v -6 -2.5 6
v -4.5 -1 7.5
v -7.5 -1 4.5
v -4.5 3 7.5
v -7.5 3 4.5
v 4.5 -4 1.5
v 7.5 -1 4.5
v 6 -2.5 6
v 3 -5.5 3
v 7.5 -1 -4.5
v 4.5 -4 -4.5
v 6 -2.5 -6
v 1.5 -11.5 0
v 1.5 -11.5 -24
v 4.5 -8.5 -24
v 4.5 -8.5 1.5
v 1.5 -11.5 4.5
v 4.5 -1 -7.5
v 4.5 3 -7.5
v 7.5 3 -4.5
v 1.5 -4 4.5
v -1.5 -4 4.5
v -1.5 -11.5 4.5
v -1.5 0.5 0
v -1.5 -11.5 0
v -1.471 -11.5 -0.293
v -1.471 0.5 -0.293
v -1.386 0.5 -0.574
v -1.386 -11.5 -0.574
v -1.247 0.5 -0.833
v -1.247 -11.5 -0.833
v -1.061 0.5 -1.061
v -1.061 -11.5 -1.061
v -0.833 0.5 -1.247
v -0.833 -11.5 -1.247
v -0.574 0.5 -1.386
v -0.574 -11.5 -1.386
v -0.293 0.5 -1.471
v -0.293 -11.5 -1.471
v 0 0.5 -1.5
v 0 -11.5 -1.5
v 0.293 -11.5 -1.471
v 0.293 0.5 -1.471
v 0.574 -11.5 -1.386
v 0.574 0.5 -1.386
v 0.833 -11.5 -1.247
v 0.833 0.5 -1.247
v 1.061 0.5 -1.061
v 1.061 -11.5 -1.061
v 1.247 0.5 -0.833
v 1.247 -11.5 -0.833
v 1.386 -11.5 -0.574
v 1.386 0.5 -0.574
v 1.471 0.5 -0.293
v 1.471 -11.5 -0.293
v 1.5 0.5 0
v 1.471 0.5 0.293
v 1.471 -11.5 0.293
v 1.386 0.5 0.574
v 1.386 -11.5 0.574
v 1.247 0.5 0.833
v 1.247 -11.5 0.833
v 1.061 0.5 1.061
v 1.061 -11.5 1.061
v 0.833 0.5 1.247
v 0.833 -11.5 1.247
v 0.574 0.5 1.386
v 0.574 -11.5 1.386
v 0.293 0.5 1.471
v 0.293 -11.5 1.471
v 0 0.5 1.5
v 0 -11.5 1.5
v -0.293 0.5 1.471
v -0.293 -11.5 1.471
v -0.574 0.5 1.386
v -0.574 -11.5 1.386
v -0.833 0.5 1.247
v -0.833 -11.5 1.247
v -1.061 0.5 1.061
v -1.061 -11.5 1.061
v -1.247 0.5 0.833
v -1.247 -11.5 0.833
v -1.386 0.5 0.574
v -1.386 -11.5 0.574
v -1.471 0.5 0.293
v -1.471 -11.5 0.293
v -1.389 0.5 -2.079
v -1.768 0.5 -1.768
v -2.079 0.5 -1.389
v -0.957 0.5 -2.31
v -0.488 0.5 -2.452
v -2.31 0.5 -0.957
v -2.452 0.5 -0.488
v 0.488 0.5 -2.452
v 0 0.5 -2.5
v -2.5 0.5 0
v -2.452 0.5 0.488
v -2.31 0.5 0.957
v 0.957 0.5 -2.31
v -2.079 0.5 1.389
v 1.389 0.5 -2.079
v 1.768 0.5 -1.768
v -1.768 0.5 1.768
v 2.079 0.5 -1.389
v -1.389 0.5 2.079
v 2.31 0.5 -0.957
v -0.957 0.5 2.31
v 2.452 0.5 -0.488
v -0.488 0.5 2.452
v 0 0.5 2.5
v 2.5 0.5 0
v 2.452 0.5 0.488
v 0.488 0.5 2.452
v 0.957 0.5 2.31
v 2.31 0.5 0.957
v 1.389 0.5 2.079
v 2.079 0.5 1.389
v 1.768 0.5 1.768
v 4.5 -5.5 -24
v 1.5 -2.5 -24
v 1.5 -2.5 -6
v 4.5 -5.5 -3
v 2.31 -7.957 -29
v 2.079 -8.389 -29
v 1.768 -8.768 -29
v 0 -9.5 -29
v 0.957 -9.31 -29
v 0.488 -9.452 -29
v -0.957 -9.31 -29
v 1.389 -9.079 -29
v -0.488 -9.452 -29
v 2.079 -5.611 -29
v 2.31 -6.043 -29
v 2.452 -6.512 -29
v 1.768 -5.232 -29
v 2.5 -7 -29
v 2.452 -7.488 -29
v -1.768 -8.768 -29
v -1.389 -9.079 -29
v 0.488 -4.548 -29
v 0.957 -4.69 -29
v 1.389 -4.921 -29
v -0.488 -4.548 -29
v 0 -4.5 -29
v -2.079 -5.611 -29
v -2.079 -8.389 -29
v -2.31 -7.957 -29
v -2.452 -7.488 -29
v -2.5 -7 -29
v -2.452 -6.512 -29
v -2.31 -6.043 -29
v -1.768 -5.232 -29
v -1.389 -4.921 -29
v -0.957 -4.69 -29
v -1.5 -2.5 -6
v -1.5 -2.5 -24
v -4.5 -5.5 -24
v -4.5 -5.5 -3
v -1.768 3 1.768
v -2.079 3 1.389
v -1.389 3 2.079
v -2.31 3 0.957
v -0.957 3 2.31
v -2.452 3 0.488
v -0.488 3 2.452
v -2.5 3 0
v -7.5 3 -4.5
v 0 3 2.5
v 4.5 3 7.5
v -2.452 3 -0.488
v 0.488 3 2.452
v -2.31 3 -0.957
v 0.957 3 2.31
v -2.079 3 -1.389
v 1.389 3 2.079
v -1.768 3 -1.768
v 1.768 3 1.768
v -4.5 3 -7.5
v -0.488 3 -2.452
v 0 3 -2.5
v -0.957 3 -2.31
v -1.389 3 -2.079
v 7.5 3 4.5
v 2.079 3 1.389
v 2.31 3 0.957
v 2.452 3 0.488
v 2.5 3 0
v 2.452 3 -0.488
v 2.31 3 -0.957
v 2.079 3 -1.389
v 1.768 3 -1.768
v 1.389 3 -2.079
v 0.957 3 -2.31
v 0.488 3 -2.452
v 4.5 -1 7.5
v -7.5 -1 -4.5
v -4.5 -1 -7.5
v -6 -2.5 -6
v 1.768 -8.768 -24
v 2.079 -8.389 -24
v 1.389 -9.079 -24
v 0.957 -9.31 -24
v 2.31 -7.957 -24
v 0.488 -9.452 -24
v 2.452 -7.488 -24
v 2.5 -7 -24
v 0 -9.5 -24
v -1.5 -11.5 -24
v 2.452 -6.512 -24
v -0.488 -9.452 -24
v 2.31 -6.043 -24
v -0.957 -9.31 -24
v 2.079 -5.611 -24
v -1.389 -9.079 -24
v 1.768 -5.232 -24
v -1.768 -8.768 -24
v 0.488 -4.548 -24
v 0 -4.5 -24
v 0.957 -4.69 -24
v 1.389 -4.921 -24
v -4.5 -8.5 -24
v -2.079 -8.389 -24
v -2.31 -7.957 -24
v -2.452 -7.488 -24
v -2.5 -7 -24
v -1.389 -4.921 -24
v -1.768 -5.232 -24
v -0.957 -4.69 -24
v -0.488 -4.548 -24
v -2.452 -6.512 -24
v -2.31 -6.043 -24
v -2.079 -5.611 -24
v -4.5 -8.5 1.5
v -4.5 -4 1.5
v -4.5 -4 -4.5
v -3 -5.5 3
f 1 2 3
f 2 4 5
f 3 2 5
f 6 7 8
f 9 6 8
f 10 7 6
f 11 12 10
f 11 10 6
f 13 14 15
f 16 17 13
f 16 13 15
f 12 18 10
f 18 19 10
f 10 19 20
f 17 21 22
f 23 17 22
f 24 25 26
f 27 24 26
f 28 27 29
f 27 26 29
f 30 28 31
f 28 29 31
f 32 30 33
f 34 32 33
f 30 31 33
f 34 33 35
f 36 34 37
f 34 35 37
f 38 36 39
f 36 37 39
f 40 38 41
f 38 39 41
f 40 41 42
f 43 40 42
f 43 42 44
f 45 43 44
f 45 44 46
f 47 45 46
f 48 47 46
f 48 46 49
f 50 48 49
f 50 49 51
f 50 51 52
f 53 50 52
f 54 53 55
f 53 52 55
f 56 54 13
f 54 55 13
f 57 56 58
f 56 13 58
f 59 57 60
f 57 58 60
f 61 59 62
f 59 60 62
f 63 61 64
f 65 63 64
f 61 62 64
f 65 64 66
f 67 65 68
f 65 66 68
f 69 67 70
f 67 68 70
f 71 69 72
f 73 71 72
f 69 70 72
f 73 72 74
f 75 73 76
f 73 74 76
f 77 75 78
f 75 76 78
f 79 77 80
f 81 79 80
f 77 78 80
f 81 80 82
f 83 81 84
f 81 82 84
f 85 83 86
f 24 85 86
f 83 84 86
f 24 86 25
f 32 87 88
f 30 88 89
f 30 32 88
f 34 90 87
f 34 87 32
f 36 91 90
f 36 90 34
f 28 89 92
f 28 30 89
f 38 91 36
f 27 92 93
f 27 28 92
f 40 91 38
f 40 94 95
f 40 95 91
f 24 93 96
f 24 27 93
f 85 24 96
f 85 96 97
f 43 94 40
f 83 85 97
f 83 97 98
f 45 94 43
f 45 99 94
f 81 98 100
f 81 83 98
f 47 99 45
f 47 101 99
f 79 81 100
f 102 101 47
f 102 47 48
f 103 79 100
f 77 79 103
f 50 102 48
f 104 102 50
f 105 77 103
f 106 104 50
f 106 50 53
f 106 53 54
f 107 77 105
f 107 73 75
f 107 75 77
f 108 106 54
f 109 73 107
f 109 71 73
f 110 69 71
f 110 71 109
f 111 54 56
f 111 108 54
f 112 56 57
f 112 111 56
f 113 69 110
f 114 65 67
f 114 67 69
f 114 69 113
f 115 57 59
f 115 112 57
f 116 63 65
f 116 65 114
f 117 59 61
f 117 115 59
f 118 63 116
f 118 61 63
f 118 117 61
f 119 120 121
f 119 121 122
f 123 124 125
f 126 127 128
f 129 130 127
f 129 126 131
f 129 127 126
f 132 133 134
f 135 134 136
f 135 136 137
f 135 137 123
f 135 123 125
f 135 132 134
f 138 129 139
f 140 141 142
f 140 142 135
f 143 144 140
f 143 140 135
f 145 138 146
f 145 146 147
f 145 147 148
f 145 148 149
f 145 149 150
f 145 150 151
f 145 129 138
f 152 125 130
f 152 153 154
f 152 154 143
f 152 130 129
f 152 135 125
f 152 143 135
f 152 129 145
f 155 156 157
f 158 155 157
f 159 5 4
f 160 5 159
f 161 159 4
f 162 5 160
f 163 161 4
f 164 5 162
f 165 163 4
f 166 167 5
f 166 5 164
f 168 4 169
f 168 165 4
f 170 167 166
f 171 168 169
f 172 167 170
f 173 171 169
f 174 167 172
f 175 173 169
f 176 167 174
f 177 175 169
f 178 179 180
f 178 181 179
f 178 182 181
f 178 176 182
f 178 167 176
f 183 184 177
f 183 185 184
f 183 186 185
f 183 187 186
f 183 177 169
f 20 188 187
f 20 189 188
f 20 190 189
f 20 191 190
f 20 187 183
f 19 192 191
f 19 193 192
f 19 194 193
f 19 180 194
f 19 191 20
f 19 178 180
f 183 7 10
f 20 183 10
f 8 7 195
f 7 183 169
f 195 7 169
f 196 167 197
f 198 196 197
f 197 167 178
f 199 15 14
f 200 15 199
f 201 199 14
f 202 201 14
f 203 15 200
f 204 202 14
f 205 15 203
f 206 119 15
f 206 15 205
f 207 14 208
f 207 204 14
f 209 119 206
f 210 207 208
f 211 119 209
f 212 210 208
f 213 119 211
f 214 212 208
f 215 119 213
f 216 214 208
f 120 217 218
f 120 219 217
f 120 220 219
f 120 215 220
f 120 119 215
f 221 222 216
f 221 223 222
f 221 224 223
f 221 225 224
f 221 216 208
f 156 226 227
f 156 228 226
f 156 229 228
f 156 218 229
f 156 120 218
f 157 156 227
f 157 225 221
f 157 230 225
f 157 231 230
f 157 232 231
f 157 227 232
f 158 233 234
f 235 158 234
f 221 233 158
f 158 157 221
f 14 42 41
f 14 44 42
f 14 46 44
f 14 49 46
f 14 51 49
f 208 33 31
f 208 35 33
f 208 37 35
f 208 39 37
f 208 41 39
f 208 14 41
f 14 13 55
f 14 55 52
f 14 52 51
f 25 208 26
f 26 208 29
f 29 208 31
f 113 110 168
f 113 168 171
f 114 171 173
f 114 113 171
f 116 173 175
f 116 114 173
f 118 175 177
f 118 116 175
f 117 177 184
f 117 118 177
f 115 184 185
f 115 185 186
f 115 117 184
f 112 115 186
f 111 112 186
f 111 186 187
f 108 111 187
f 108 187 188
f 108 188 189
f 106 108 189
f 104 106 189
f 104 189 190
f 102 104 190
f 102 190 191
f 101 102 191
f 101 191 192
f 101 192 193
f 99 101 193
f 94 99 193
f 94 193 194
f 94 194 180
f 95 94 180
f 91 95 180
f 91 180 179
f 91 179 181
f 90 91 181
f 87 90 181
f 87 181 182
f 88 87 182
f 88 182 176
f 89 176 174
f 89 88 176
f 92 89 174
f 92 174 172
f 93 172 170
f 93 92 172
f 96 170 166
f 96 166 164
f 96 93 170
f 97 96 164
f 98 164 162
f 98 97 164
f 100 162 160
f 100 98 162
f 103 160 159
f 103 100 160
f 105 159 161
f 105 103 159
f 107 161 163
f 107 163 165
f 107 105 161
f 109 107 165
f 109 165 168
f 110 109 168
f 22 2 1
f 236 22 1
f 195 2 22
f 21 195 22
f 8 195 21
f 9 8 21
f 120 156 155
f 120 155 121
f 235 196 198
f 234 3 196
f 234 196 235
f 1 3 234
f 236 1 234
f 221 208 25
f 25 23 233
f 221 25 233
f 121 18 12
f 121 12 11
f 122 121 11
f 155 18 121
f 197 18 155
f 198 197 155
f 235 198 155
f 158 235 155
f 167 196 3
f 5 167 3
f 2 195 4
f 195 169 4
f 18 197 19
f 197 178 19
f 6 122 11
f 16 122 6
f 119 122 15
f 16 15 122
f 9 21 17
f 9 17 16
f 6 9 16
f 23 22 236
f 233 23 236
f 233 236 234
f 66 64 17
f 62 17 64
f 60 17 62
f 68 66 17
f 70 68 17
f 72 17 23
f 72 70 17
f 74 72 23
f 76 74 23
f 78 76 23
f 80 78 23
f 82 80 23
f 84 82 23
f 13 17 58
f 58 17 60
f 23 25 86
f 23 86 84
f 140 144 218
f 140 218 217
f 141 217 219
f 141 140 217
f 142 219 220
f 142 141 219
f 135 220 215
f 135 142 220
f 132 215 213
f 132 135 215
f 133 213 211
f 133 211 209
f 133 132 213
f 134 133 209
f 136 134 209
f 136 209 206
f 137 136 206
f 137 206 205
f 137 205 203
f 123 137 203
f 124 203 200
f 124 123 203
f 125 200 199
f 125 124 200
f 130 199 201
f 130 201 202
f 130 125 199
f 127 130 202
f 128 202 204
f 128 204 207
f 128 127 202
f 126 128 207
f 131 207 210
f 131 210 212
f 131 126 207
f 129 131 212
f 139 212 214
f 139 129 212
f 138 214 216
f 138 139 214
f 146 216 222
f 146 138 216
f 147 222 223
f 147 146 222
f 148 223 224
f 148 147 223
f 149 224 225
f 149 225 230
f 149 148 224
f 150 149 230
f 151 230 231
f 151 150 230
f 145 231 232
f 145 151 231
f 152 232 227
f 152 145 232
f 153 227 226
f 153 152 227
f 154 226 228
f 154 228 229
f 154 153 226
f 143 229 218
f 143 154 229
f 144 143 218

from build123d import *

# Parameters (mm, degrees)
SKETCH1_W                = 15
SKETCH1_H                = 15
SKETCH1_R                = 2.5
BOSS_EXTRUDE1_DEPTH      = 3
CHAMFER1_SIZE            = 3
SKETCH1_6_R              = 2.5
BOSS_EXTRUDE3_DEPTH      = 0.5
SKETCH18_W               = 9
SKETCH18_H               = 9
CHAMFER4_SIZE            = 4
CHAMFER5_SIZE            = 3
SKETCH19_OUTSIDE_W       = 25.408
SKETCH19_OUTSIDE_H       = 24.908
SKETCH19_OUTSIDE_R       = 2.5
CUT_EXTRUDE2_DEPTH       = 5
F_3_0_3_DIAMETER_HOLE1_D = 3


with BuildPart() as part:
    # Sketch1 → Boss-Extrude1 (new body)
    with BuildSketch(Plane(origin=(0, 0, 0), x_dir=(1, 0, 0), z_dir=(0, 1, 0))):
        Rectangle(SKETCH1_W, SKETCH1_H)
        with Locations(Location((0, 0, 0), (0, 0, 270))):
            Circle(SKETCH1_R, mode=Mode.SUBTRACT)
    extrude(amount=BOSS_EXTRUDE1_DEPTH)

    # Chamfer1
    chamfer1_edges = [part.edges().sort_by_distance(p)[0] for p in [
        (7.5, 1.5, 7.5),
        (-7.5, 1.5, 7.5),
        (-7.5, 1.5, -7.5),
        (7.5, 1.5, -7.5),
    ]]
    chamfer(chamfer1_edges, length=CHAMFER1_SIZE)

    # Sketch1<6> → Boss-Extrude3 (add)
    with BuildSketch(Plane(origin=(0, 0, 0), x_dir=(1, 0, 0), z_dir=(0, 1, 0))):
        with Locations(Location((0, 0, 0), (0, 0, 270))):
            Circle(SKETCH1_6_R)
    extrude(amount=BOSS_EXTRUDE3_DEPTH)

    # Sweep3: sweep along a path in Sketch2
    with BuildLine(Plane(origin=(0, 0, 0), x_dir=(0, 0, -1), z_dir=(1, 0, 0))) as sweep3_path:
        Line((0, 0), (0, -7))
        Line((0, -7), (29, -7))
    # Sketch18 → Sweep3 (sweep)
    with BuildSketch(Plane.XZ):
        Rectangle(SKETCH18_W, SKETCH18_H)
    sweep(path=sweep3_path.line, transition=Transition.RIGHT)

    # Chamfer4
    # the kernel refuses this chamfer: 4 mm, written as the material it adds along each edge
    with BuildSketch(Plane(origin=(-14.786731952, 0, -4.5), x_dir=(0, 0, -1), z_dir=(1, 0, 0))) as chamfer4_piece_1_section:
        Polygon((CHAMFER4_SIZE, 0), (0, -CHAMFER4_SIZE), (0, 0), align=None)
    chamfer4_piece_1 = extrude(amount=29.573463904, mode=Mode.PRIVATE)
    chamfer4_piece_1 = split(chamfer4_piece_1, bisect_by=Plane(origin=(-14.786731952, 0, -7.5), z_dir=(0, 0, 1)), keep=Keep.TOP, mode=Mode.PRIVATE)
    chamfer4_piece_1 = split(chamfer4_piece_1, bisect_by=Plane(origin=(-11.143365976, 0, -0.856634024), z_dir=(0.7071067811865476, 0, 0.7071067811865476)), keep=Keep.TOP, mode=Mode.PRIVATE)
    chamfer4_piece_1 = split(chamfer4_piece_1, bisect_by=Plane(origin=(-3.643365976, 0, -15.643365976), z_dir=(-0.7071067811865476, 0, 0.7071067811865476)), keep=Keep.TOP, mode=Mode.PRIVATE)
    chamfer4_piece_1 = split(chamfer4_piece_1, bisect_by=Plane(origin=(-11.643365976, 3.143365976, -4.5), z_dir=(0.7071067811865476, 0.7071067811865475, 0)), keep=Keep.TOP, mode=Mode.PRIVATE)
    chamfer4_piece_1 = split(chamfer4_piece_1, bisect_by=Plane(origin=(-3.143365976, -11.643365976, -4.5), z_dir=(-0.7071067811865476, 0.7071067811865475, 0)), keep=Keep.TOP, mode=Mode.PRIVATE)
    add(chamfer4_piece_1)
    with BuildSketch(Plane(origin=(4.5, 0, -14.786731952), x_dir=(1, 0, 0), z_dir=(0, 0, 1))) as chamfer4_piece_2_section:
        Polygon((CHAMFER4_SIZE, 0), (0, -CHAMFER4_SIZE), (0, 0), align=None)
    chamfer4_piece_2 = extrude(amount=29.573463904, mode=Mode.PRIVATE)
    chamfer4_piece_2 = split(chamfer4_piece_2, bisect_by=Plane(origin=(0.856634024, 0, -11.143365976), z_dir=(-0.7071067811865476, 0, 0.7071067811865476)), keep=Keep.TOP, mode=Mode.PRIVATE)
    chamfer4_piece_2 = split(chamfer4_piece_2, bisect_by=Plane(origin=(7.5, 0, -14.786731952), z_dir=(-1, 0, 0)), keep=Keep.TOP, mode=Mode.PRIVATE)
    chamfer4_piece_2 = split(chamfer4_piece_2, bisect_by=Plane(origin=(15.643365976, 0, -3.643365976), z_dir=(-0.7071067811865476, 0, -0.7071067811865476)), keep=Keep.TOP, mode=Mode.PRIVATE)
    chamfer4_piece_2 = split(chamfer4_piece_2, bisect_by=Plane(origin=(4.5, 3.143365976, -11.643365976), z_dir=(0, 0.7071067811865475, 0.7071067811865476)), keep=Keep.TOP, mode=Mode.PRIVATE)
    chamfer4_piece_2 = split(chamfer4_piece_2, bisect_by=Plane(origin=(4.5, -11.643365976, -3.143365976), z_dir=(0, 0.7071067811865477, -0.7071067811865475)), keep=Keep.TOP, mode=Mode.PRIVATE)
    add(chamfer4_piece_2)
    with BuildSketch(Plane(origin=(14.786731952, 0, 4.5), x_dir=(0, 0, 1), z_dir=(-1, 0, 0))) as chamfer4_piece_3_section:
        Polygon((CHAMFER4_SIZE, 0), (0, -CHAMFER4_SIZE), (0, 0), align=None)
    chamfer4_piece_3 = extrude(amount=29.573463904, mode=Mode.PRIVATE)
    chamfer4_piece_3 = split(chamfer4_piece_3, bisect_by=Plane(origin=(3.643365976, 0, 15.643365976), z_dir=(0.7071067811865476, 0, -0.7071067811865476)), keep=Keep.TOP, mode=Mode.PRIVATE)
    chamfer4_piece_3 = split(chamfer4_piece_3, bisect_by=Plane(origin=(11.143365976, 0, 0.856634024), z_dir=(-0.7071067811865476, 0, -0.7071067811865476)), keep=Keep.TOP, mode=Mode.PRIVATE)
    chamfer4_piece_3 = split(chamfer4_piece_3, bisect_by=Plane(origin=(14.786731952, 0, 7.5), z_dir=(0, 0, -1)), keep=Keep.TOP, mode=Mode.PRIVATE)
    chamfer4_piece_3 = split(chamfer4_piece_3, bisect_by=Plane(origin=(3.143365976, -11.643365976, 4.5), z_dir=(0.7071067811865476, 0.7071067811865475, 0)), keep=Keep.TOP, mode=Mode.PRIVATE)
    chamfer4_piece_3 = split(chamfer4_piece_3, bisect_by=Plane(origin=(11.643365976, 3.143365976, 4.5), z_dir=(-0.7071067811865476, 0.7071067811865475, 0)), keep=Keep.TOP, mode=Mode.PRIVATE)
    add(chamfer4_piece_3)
    with BuildSketch(Plane(origin=(-4.5, 0, 14.786731952), x_dir=(-1, 0, 0), z_dir=(0, 0, -1))) as chamfer4_piece_4_section:
        Polygon((CHAMFER4_SIZE, 0), (0, -CHAMFER4_SIZE), (0, 0), align=None)
    chamfer4_piece_4 = extrude(amount=29.573463904, mode=Mode.PRIVATE)
    chamfer4_piece_4 = split(chamfer4_piece_4, bisect_by=Plane(origin=(-15.643365976, 0, 3.643365976), z_dir=(0.7071067811865476, 0, 0.7071067811865476)), keep=Keep.TOP, mode=Mode.PRIVATE)
    chamfer4_piece_4 = split(chamfer4_piece_4, bisect_by=Plane(origin=(-7.5, 0, 14.786731952), z_dir=(1, 0, 0)), keep=Keep.TOP, mode=Mode.PRIVATE)
    chamfer4_piece_4 = split(chamfer4_piece_4, bisect_by=Plane(origin=(-0.856634024, 0, 11.143365976), z_dir=(0.7071067811865476, 0, -0.7071067811865476)), keep=Keep.TOP, mode=Mode.PRIVATE)
    chamfer4_piece_4 = split(chamfer4_piece_4, bisect_by=Plane(origin=(-4.5, -11.643365976, 3.143365976), z_dir=(0, 0.7071067811865475, 0.7071067811865476)), keep=Keep.TOP, mode=Mode.PRIVATE)
    chamfer4_piece_4 = split(chamfer4_piece_4, bisect_by=Plane(origin=(-4.5, 3.143365976, 11.643365976), z_dir=(0, 0.7071067811865477, -0.7071067811865475)), keep=Keep.TOP, mode=Mode.PRIVATE)
    add(chamfer4_piece_4)

    # Chamfer5
    # the kernel refuses this chamfer: 3 mm, written as the material it takes off along each edge
    with BuildSketch(Plane(origin=(4.5, -11.5, 12.215048964), x_dir=(-1, 0, 0), z_dir=(0, 0, -1))) as chamfer5_piece_1:
        Polygon((CHAMFER5_SIZE, 0), (0, CHAMFER5_SIZE), (0, 0), align=None)
    extrude(amount=48.930097928, mode=Mode.SUBTRACT)
    with BuildSketch(Plane(origin=(-4.5, -11.5, 12.215048964), x_dir=(1, 0, 0), z_dir=(0, 0, -1))) as chamfer5_piece_2:
        Polygon((CHAMFER5_SIZE, 0), (0, -CHAMFER5_SIZE), (0, 0), align=None)
    extrude(amount=48.930097928, mode=Mode.SUBTRACT)
    with BuildSketch(Plane(origin=(4.5, -2.5, 1.715048964), x_dir=(-1, 0, 0), z_dir=(0, 0, -1))) as chamfer5_piece_3_section:
        Polygon((CHAMFER5_SIZE, 0), (0, -CHAMFER5_SIZE), (0, 0), align=None)
    chamfer5_piece_3 = extrude(amount=38.430097928, mode=Mode.PRIVATE)
    chamfer5_piece_3 = split(chamfer5_piece_3, bisect_by=Plane(origin=(4.5, -6.357524482, -2.142475518), z_dir=(0, -0.7071067811865476, -0.7071067811865476)), keep=Keep.TOP, mode=Mode.PRIVATE)
    add(chamfer5_piece_3, mode=Mode.SUBTRACT)
    with BuildSketch(Plane(origin=(-4.5, -2.5, 1.715048964), x_dir=(1, 0, 0), z_dir=(0, 0, -1))) as chamfer5_piece_4_section:
        Polygon((CHAMFER5_SIZE, 0), (0, CHAMFER5_SIZE), (0, 0), align=None)
    chamfer5_piece_4 = extrude(amount=38.430097928, mode=Mode.PRIVATE)
    chamfer5_piece_4 = split(chamfer5_piece_4, bisect_by=Plane(origin=(-4.5, -6.357524482, -2.142475518), z_dir=(0, -0.7071067811865476, -0.7071067811865476)), keep=Keep.TOP, mode=Mode.PRIVATE)
    add(chamfer5_piece_4, mode=Mode.SUBTRACT)
    with BuildSketch(Plane(origin=(4.5, 3.715048964, 4.5), x_dir=(-1, 0, 0), z_dir=(0, -1, 0))) as chamfer5_piece_5_section:
        Polygon((CHAMFER5_SIZE, 0), (0, CHAMFER5_SIZE), (0, 0), align=None)
    chamfer5_piece_5 = extrude(amount=22.930097928, mode=Mode.PRIVATE)
    chamfer5_piece_5 = split(chamfer5_piece_5, bisect_by=Plane(origin=(8.357524482, -0.142475518, 4.5), z_dir=(0.7071067811865476, -0.7071067811865476, 0)), keep=Keep.TOP, mode=Mode.PRIVATE)
    add(chamfer5_piece_5, mode=Mode.SUBTRACT)
    with BuildSketch(Plane(origin=(4.5, 3.715048964, 4.5), x_dir=(-1, 0, 0), z_dir=(0, -1, 0))) as chamfer5_piece_6_section:
        Polygon((CHAMFER5_SIZE, 0), (0, CHAMFER5_SIZE), (0, 0), align=None)
    chamfer5_piece_6 = extrude(amount=22.930097928, mode=Mode.PRIVATE)
    chamfer5_piece_6 = split(chamfer5_piece_6, bisect_by=Plane(origin=(4.5, -0.142475518, 8.357524482), z_dir=(0, -0.7071067811865476, 0.7071067811865476)), keep=Keep.TOP, mode=Mode.PRIVATE)
    add(chamfer5_piece_6, mode=Mode.SUBTRACT)
    with BuildSketch(Plane(origin=(-4.5, 3.715048964, 4.5), x_dir=(1, 0, 0), z_dir=(0, -1, 0))) as chamfer5_piece_7_section:
        Polygon((CHAMFER5_SIZE, 0), (0, -CHAMFER5_SIZE), (0, 0), align=None)
    chamfer5_piece_7 = extrude(amount=22.930097928, mode=Mode.PRIVATE)
    chamfer5_piece_7 = split(chamfer5_piece_7, bisect_by=Plane(origin=(-8.357524482, -0.142475518, 4.5), z_dir=(-0.7071067811865476, -0.7071067811865476, 0)), keep=Keep.TOP, mode=Mode.PRIVATE)
    add(chamfer5_piece_7, mode=Mode.SUBTRACT)
    with BuildSketch(Plane(origin=(-4.5, 3.715048964, 4.5), x_dir=(1, 0, 0), z_dir=(0, -1, 0))) as chamfer5_piece_8_section:
        Polygon((CHAMFER5_SIZE, 0), (0, -CHAMFER5_SIZE), (0, 0), align=None)
    chamfer5_piece_8 = extrude(amount=22.930097928, mode=Mode.PRIVATE)
    chamfer5_piece_8 = split(chamfer5_piece_8, bisect_by=Plane(origin=(-4.5, -0.142475518, 8.357524482), z_dir=(0, -0.7071067811865476, 0.7071067811865476)), keep=Keep.TOP, mode=Mode.PRIVATE)
    add(chamfer5_piece_8, mode=Mode.SUBTRACT)

    # Sketch19 outside → Cut-Extrude2 (cut)
    with BuildSketch(Plane(origin=(0, 0, -29), x_dir=(-1, 0, 0), z_dir=(0, 0, -1))):
        with Locations((0, -4.25)):
            Rectangle(SKETCH19_OUTSIDE_W, SKETCH19_OUTSIDE_H)
        with Locations(Location((0, -7, 0), (0, 0, 90))):
            Circle(SKETCH19_OUTSIDE_R, mode=Mode.SUBTRACT)
    extrude(amount=-CUT_EXTRUDE2_DEPTH, mode=Mode.SUBTRACT)

    # Ø3.0 (3) Diameter Hole1 (through all)
    with Locations(Plane(origin=(0, 3, 0), x_dir=(1, 0, 0), z_dir=(0, 1, 0))):
        with Locations((0, 0)):
            Hole(F_3_0_3_DIAMETER_HOLE1_D / 2)


solid = part.part
